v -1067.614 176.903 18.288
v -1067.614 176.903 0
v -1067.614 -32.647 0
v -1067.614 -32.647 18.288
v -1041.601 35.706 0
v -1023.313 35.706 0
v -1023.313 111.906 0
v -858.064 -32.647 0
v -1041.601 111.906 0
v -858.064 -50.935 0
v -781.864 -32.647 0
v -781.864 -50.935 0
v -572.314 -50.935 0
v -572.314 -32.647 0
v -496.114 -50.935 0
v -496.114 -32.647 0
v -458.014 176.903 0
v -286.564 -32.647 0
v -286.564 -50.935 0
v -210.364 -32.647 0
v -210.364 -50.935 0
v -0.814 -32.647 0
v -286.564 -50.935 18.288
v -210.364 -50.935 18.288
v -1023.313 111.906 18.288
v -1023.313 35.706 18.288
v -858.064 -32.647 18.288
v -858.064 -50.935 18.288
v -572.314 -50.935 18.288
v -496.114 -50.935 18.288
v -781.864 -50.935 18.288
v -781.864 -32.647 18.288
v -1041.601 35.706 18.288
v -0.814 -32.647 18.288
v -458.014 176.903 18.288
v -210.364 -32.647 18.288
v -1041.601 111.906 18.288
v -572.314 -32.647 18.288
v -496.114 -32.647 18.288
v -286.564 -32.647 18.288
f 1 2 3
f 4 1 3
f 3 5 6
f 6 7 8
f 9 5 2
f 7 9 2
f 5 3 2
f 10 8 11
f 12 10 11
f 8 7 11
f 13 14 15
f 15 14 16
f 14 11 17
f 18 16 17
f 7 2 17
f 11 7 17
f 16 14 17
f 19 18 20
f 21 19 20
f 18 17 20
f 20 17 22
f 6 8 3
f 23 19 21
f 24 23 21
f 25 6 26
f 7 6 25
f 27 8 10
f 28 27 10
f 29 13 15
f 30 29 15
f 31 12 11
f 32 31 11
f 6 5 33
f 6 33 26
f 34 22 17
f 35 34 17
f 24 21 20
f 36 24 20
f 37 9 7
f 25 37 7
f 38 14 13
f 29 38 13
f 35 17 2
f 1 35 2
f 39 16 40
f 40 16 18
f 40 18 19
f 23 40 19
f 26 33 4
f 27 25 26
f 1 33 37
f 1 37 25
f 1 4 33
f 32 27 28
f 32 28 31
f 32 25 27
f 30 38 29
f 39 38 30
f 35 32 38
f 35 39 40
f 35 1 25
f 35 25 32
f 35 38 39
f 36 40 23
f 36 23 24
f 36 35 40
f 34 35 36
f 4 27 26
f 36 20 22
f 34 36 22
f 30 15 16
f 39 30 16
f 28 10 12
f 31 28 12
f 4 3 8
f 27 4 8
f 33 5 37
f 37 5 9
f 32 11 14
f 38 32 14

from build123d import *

# Parameters (mm, degrees)
F1_DEPTH = 18.288
F2_W     = 18.288
F2_H     = 76.2
F3_DEPTH = 25.4


with BuildPart() as f1:
    # F0 (on Top) → F1 (new body)
    with BuildSketch(Plane.XY):
        Polygon((-1067.61384, 176.902703), (-1067.61384, -32.647297), (-858.06384, -32.647297), (-858.06384, -50.935297), (-781.86384, -50.935297), (-781.86384, -32.647297), (-572.31384, -32.647297), (-572.31384, -50.935297), (-496.11384, -50.935297), (-496.11384, -32.647297), (-286.56384, -32.647297), (-286.56384, -50.935297), (-210.36384, -50.935297), (-210.36384, -32.647297), (-0.81384, -32.647297), (-458.01384, 176.902703), align=None)
    extrude(amount=F1_DEPTH)

    # F2 (on Top) → F3 (cut)
    with BuildSketch(Plane.XY):
        with Locations((-1032.45726, 73.806196)):
            Rectangle(F2_W, F2_H)
    extrude(amount=F3_DEPTH, mode=Mode.SUBTRACT)


solid = f1.part
